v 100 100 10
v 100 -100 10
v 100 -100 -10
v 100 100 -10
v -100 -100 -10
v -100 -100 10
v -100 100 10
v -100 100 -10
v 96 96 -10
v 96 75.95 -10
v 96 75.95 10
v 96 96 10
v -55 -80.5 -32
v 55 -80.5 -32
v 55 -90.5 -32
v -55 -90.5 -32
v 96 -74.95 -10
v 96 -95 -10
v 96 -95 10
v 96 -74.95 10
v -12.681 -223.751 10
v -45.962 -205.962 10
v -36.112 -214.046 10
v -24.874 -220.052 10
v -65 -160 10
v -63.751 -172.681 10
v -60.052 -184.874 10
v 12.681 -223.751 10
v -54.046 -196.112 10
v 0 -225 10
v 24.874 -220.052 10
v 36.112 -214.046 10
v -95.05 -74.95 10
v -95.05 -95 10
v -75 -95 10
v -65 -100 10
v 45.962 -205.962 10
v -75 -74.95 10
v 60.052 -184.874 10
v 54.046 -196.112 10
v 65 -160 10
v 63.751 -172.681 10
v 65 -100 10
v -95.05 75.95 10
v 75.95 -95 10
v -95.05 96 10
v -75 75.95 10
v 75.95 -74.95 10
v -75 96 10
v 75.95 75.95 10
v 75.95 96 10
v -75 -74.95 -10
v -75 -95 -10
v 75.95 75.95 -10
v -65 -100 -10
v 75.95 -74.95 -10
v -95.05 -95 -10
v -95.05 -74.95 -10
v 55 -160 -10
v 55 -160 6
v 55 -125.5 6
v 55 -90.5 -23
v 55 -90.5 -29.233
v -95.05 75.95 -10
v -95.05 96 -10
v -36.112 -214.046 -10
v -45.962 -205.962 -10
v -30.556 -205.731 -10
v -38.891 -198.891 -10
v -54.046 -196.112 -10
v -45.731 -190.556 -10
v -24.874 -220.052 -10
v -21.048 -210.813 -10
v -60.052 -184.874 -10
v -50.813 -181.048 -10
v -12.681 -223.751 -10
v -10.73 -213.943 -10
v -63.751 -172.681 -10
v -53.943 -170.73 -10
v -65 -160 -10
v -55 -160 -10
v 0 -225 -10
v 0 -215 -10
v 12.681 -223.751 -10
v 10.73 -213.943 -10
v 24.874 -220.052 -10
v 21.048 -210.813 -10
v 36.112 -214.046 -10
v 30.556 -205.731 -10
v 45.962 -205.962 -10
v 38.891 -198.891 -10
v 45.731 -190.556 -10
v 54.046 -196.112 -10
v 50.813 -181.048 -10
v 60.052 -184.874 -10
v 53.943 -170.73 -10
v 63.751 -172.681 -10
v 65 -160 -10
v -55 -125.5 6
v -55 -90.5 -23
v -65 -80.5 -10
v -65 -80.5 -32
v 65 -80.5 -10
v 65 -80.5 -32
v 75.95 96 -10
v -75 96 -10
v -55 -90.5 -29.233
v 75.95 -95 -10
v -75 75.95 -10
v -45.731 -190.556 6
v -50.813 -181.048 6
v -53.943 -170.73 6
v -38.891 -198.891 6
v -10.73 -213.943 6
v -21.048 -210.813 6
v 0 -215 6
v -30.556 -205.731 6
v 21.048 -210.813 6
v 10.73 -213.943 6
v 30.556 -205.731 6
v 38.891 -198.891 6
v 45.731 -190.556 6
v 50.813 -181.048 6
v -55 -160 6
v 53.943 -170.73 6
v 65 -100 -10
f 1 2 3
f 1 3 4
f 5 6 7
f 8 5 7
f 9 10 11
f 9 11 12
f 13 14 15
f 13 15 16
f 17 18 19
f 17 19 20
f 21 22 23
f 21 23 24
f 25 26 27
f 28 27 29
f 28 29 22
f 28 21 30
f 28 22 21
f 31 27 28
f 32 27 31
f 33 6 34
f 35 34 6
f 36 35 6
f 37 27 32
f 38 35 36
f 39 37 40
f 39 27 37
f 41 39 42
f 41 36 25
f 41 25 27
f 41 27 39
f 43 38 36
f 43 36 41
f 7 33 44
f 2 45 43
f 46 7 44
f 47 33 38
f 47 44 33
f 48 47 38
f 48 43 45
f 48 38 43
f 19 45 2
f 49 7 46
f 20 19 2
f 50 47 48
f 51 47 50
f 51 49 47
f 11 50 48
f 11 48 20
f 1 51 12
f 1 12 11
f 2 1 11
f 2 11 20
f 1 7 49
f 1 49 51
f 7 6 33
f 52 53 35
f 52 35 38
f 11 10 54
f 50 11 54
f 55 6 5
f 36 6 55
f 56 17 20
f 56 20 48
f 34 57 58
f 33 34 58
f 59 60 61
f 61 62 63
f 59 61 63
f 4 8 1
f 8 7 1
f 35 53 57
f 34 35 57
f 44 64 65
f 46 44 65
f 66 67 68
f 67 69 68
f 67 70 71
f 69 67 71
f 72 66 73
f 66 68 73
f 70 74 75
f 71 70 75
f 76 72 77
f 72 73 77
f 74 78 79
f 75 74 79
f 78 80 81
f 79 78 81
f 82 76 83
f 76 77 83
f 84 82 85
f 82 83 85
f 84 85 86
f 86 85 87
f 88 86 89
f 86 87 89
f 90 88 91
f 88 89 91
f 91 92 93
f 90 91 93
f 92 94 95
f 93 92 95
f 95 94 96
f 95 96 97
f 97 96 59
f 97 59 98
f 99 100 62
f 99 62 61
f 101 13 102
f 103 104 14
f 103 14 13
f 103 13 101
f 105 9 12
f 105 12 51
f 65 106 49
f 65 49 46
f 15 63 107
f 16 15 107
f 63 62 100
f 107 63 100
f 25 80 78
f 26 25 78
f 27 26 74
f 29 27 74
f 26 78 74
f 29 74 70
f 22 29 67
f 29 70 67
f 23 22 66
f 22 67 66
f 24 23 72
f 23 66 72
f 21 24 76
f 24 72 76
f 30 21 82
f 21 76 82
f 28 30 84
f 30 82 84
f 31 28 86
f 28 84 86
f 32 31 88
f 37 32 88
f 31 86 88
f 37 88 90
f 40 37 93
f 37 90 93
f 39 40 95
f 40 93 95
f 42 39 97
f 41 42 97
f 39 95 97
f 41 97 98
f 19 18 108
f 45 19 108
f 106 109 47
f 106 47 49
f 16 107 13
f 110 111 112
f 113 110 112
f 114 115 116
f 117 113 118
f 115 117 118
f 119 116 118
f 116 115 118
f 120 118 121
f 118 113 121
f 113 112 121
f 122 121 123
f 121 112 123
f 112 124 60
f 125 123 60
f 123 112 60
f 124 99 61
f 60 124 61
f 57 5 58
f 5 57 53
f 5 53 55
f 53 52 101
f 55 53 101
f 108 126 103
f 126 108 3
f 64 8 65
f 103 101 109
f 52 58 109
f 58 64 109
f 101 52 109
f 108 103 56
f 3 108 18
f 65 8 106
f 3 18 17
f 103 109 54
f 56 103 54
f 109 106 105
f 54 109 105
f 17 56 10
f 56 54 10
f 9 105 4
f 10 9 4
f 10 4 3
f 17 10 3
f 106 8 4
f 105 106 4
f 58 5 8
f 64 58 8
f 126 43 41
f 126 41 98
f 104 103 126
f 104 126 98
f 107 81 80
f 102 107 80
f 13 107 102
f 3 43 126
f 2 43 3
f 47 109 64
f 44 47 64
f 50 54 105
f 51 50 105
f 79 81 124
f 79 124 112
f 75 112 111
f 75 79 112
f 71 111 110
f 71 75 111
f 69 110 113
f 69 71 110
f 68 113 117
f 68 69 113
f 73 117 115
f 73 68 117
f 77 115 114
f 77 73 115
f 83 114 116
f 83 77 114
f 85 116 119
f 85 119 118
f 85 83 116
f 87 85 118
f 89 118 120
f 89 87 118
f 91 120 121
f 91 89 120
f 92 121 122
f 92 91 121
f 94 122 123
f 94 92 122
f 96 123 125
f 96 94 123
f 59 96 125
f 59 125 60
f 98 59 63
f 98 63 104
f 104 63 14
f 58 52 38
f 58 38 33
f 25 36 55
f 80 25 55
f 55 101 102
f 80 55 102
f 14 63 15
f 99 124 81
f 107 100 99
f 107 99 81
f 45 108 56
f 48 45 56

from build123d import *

# Parameters (mm, degrees)
SKETCH_1_W          = 200
SKETCH_1_H          = 200
EXTRUDE_1_DEPTH     = 10
SKETCH_2_W          = 20.05
SKETCH_2_H          = 20.05
CUT_EXTRUDE_2_DEPTH = 40
SKETCH_5_W          = 130
SKETCH_5_H          = 20
EXTRUDE_2_DEPTH     = 60
EXTRUDE_3_DEPTH     = 20
CUT_EXTRUDE_4_DEPTH = 16
SKETCH_10_W         = 110
SKETCH_10_H         = 10
EXTRUDE_5_DEPTH     = 38
EXTRUDE_6_DEPTH     = 10
EXTRUDE_7_DEPTH     = 120


with BuildPart() as part:
    # 草图1 → 凸台-拉伸1 (new, symmetric)
    with BuildSketch(Plane.XY):
        Rectangle(SKETCH_1_W, SKETCH_1_H)
    extrude(amount=EXTRUDE_1_DEPTH, both=True)

    # 草图2 → 切除-拉伸2 (cut)
    with BuildSketch(Plane(origin=(0, 0, -10), x_dir=(-1, 0, 0), z_dir=(0, 0, -1))):
        with Locations((-85.975, 85.975)):
            Rectangle(SKETCH_2_W, SKETCH_2_H)
        with Locations((85.025, 85.975)):
            Rectangle(SKETCH_2_W, SKETCH_2_H)
        with Locations((85.025, -84.975)):
            Rectangle(SKETCH_2_W, SKETCH_2_H)
        with Locations((-85.975, -84.975)):
            Rectangle(SKETCH_2_W, SKETCH_2_H)
    extrude(amount=-CUT_EXTRUDE_2_DEPTH, mode=Mode.SUBTRACT)

    # 草图5 → 凸台-拉伸2 (add)
    with BuildSketch(Plane.XZ.offset(100)):
        Rectangle(SKETCH_5_W, SKETCH_5_H)
    extrude(amount=EXTRUDE_2_DEPTH)

    # 草图6 → 凸台-拉伸3 (add)
    with BuildSketch(Plane(origin=(0, 0, -10), x_dir=(-1, 0, 0), z_dir=(0, 0, -1))):
        with BuildLine():
            Line((-65, -160), (65, -160))
            ThreePointArc((65, -160), (0, -225), (-65, -160))
        make_face()
    extrude(amount=-EXTRUDE_3_DEPTH)

    # 草图7 → 切除-拉伸4 (cut)
    with BuildSketch(Plane(origin=(0, 0, -10), x_dir=(-1, 0, 0), z_dir=(0, 0, -1))):
        with BuildLine():
            Line((-55, -100), (-55, -80.5))
            Line((-55, -80.5), (55, -80.5))
            Line((55, -80.5), (55, -100))
            Line((55, -100), (55, -160))
            ThreePointArc((55, -160), (0, -215), (-55, -160))
            Line((-55, -160), (-55, -100))
        make_face()
    extrude(amount=-CUT_EXTRUDE_4_DEPTH, mode=Mode.SUBTRACT)

    # 草图10 → 凸台-拉伸5 (add)
    with BuildSketch(Plane(origin=(0, 0, 6), x_dir=(-1, 0, 0), z_dir=(0, 0, -1))):
        with Locations((0, -85.5)):
            Rectangle(SKETCH_10_W, SKETCH_10_H)
    extrude(amount=EXTRUDE_5_DEPTH)

    # 草图11 → 凸台-拉伸6 (add)
    with BuildSketch(Plane(origin=(55, 0, 0), x_dir=(0, 0, -1), z_dir=(1, 0, 0))):
        Polygon((32, -80.5), (10, -80.5), (10, -160), align=None)
    extrude_6 = extrude(amount=EXTRUDE_6_DEPTH)

    # 镜向1: 凸台-拉伸6 across plane
    add(extrude_6.mirror(Plane(origin=(0, 0, 0), x_dir=(0, 0, 1), z_dir=(1, 0, 0))))

    # 草图12 → 凸台-拉伸7 (add)
    with BuildSketch(Plane(origin=(-55, 0, 0), x_dir=(0, 0, -1), z_dir=(1, 0, 0))):
        Polygon((-6, -125.5), (-6, -90.5), (23, -90.5), align=None)
    extrude(amount=EXTRUDE_7_DEPTH)


solid = part.part
